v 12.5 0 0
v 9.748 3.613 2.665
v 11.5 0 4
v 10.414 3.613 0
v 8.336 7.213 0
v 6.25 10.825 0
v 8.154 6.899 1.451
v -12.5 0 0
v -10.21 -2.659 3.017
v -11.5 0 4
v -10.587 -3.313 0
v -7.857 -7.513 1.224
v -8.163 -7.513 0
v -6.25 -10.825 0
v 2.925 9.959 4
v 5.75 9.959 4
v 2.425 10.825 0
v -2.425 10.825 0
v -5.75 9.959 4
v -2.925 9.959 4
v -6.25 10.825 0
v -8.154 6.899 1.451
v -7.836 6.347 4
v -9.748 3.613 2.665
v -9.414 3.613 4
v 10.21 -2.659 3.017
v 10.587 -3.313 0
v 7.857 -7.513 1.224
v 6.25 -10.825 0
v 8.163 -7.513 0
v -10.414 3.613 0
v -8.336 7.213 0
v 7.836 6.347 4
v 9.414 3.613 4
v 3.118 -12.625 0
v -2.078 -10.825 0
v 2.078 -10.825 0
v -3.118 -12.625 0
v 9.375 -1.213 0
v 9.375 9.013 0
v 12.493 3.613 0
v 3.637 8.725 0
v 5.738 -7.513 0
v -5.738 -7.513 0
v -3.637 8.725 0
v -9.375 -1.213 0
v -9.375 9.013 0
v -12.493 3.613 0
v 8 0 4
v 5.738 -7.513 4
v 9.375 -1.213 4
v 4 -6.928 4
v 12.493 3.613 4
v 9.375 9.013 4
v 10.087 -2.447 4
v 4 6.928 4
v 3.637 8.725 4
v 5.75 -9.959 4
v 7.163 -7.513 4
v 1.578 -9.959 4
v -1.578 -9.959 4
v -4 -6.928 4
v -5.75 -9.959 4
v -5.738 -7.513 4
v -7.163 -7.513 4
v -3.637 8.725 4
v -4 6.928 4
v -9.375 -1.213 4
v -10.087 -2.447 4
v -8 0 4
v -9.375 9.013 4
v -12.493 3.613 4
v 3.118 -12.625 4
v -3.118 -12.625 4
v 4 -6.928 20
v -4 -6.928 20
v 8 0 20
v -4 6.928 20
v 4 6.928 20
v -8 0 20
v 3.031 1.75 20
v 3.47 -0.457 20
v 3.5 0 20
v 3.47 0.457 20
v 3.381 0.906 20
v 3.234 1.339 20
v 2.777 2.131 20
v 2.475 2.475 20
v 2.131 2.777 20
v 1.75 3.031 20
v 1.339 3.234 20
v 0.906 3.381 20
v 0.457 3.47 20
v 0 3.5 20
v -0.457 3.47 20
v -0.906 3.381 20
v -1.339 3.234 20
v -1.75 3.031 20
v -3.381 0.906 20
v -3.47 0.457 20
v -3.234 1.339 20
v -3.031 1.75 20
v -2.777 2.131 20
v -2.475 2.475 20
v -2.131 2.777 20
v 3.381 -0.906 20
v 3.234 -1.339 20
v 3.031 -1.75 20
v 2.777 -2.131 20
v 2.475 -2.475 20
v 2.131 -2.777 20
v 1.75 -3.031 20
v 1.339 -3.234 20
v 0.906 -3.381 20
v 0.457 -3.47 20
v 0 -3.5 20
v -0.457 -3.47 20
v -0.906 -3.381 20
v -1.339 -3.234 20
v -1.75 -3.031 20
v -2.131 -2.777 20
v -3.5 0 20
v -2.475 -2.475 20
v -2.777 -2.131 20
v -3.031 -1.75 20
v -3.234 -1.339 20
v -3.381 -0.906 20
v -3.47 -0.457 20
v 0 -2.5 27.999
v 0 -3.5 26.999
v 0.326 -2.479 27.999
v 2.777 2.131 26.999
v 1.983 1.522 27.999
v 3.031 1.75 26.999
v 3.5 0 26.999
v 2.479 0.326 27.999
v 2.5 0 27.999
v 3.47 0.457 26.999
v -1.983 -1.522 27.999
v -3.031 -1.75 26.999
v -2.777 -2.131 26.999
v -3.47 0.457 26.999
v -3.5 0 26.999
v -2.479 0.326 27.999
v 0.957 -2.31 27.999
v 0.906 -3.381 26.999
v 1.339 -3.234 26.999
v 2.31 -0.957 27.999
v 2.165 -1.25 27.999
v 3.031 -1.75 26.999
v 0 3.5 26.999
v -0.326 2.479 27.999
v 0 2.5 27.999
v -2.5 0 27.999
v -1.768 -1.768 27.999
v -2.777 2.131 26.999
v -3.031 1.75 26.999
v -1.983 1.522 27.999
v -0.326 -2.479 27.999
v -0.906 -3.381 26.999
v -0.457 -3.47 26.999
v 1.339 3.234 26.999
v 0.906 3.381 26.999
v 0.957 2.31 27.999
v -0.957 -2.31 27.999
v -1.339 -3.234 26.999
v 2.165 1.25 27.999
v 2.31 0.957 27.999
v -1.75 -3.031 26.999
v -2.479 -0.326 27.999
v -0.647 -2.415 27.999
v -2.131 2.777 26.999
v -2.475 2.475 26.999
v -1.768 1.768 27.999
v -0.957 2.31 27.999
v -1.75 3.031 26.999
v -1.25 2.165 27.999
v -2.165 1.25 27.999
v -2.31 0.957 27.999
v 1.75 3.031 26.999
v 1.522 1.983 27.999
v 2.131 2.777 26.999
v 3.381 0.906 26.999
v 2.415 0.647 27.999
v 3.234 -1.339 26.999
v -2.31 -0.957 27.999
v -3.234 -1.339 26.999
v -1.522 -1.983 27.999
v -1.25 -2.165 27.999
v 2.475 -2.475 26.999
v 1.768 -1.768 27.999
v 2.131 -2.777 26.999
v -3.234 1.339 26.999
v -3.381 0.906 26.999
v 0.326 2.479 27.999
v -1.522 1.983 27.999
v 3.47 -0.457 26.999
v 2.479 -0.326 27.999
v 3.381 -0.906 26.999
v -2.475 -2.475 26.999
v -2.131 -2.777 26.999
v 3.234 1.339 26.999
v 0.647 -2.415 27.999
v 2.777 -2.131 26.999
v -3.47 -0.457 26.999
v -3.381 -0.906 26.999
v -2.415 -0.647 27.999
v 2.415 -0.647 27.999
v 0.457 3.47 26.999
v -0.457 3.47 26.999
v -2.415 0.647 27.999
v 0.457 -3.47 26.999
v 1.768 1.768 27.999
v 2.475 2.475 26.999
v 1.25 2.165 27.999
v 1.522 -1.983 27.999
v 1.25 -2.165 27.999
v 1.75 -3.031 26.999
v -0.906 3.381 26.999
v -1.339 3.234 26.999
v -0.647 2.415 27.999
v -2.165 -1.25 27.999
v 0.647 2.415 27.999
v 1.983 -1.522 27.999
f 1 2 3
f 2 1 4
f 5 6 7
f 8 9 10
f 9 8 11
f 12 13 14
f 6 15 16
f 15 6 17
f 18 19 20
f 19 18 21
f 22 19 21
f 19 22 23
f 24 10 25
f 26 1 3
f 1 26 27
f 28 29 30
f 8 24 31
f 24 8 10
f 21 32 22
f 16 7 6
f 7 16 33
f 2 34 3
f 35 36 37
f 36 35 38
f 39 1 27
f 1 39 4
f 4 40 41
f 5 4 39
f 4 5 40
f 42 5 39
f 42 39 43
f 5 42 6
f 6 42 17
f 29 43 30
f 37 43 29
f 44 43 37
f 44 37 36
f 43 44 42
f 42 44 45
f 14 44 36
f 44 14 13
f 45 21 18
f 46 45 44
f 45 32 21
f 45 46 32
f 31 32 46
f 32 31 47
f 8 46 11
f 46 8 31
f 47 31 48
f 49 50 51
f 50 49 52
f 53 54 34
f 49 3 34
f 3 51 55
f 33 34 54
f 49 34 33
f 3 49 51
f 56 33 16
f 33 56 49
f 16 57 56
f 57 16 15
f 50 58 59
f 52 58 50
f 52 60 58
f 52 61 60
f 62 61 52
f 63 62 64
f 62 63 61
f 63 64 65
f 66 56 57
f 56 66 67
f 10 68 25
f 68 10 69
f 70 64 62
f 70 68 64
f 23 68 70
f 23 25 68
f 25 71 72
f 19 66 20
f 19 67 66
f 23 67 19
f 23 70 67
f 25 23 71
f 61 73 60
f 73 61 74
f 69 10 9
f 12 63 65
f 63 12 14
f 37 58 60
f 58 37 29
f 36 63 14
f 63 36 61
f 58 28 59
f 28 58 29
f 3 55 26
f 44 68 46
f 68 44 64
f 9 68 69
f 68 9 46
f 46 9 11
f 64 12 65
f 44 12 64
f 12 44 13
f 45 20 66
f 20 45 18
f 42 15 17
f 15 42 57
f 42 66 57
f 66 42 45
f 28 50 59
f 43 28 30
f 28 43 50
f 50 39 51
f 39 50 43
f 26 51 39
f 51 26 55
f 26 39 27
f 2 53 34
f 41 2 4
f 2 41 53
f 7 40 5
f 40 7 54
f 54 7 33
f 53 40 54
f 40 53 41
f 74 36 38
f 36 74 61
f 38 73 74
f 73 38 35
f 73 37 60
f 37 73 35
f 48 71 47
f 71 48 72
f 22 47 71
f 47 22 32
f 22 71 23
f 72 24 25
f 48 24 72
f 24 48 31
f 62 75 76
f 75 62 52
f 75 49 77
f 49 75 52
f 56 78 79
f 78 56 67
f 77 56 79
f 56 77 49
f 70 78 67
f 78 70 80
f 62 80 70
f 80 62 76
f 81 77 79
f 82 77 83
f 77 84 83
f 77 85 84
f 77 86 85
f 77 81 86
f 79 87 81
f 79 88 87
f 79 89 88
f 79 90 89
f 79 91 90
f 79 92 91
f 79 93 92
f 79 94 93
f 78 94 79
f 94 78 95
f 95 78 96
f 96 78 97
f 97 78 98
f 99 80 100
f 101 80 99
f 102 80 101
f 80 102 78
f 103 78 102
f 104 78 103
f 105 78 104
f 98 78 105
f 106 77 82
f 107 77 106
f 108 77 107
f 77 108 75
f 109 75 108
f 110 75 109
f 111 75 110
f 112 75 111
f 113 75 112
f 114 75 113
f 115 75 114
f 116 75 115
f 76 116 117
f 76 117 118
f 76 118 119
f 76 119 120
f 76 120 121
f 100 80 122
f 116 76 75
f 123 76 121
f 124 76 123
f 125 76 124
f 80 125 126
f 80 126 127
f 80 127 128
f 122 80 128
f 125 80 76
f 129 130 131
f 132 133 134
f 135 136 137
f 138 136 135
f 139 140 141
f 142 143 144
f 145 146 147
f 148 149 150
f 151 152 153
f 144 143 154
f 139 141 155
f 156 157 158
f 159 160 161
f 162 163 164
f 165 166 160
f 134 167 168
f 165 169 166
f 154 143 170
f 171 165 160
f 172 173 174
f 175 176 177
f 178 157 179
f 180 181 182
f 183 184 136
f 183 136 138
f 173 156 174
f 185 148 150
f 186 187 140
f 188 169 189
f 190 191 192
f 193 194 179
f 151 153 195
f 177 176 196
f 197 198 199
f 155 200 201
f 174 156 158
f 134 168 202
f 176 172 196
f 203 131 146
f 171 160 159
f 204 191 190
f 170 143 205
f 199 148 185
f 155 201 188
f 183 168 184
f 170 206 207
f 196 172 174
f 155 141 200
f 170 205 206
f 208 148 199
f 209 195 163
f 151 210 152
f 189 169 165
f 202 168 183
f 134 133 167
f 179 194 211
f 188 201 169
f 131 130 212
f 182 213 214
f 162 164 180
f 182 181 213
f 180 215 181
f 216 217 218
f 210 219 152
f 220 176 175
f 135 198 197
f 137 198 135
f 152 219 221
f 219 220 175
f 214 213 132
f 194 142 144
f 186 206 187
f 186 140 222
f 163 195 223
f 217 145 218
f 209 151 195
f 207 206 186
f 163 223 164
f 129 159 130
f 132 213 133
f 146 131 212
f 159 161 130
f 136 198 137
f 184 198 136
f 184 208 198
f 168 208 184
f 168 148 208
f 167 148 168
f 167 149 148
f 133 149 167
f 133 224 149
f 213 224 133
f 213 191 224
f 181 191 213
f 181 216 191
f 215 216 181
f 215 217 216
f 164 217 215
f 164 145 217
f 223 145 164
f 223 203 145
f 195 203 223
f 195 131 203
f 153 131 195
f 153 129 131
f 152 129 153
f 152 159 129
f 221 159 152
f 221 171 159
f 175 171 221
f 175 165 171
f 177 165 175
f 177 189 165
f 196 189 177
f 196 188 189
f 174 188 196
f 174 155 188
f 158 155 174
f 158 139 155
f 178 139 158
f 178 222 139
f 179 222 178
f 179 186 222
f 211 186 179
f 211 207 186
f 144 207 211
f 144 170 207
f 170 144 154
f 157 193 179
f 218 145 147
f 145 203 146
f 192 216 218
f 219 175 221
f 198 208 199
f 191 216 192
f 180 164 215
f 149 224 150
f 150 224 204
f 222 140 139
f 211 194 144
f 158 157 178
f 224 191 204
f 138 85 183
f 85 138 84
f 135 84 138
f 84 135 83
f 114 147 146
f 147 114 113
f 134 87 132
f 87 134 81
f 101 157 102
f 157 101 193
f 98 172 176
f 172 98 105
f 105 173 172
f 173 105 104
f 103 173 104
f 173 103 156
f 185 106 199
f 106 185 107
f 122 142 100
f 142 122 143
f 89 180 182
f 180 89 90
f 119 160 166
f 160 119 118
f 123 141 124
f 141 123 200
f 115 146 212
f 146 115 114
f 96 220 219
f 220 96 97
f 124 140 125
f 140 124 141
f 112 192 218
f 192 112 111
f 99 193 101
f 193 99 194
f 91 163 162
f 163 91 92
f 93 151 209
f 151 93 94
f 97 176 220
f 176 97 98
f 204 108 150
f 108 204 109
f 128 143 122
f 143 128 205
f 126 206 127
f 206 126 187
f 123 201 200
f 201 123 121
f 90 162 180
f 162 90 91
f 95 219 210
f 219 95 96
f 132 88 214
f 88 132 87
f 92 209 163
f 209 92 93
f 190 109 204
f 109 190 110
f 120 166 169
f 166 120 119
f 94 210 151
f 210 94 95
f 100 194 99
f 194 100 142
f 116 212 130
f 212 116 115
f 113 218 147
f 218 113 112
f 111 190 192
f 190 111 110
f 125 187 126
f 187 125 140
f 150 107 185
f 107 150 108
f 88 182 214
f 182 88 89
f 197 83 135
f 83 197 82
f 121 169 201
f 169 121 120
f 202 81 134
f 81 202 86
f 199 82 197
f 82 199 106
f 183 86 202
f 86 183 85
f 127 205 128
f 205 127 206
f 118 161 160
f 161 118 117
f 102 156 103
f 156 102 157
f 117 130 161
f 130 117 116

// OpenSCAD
$fn=48;



h = 4;
module ooshi_base(h) {
    apothem = 25 * cos((3.141592653/6)* 57.2958);
    difference() {
        union() {
            cylinder(r1=25/2, r2=23/2, h=h, $fn=6);
        }
        
        rotate([0,0,(360/12) * 1]) translate([-apothem/2,0,-0.5]) rotate([0,0,60]) cylinder(r=4.2, h=h+1, $fn=3);
        rotate([0,0,(360/12) * 9]) translate([-apothem/2,0,-0.5]) rotate([0,0,60]) cylinder(r=4.2, h=h+1, $fn=3);
        rotate([0,0,(360/12) * 5]) translate([-apothem/2,0,-0.5]) rotate([0,0,60]) cylinder(r=4.2, h=h+1, $fn=3);
    }
    
    rotate([0,0,(360/12) * 7]) translate([-apothem/2,0,0]) cylinder(r=3.6, h=h, $fn=3);
    rotate([0,0,(360/12) * 3]) translate([-apothem/2,0,0]) cylinder(r=3.6, h=h, $fn=3);
    rotate([0,0,(360/12) * 11]) translate([-apothem/2,0,0]) cylinder(r=3.6, h=h, $fn=3);
}

module ooshi() {
	h = 4;
	ooshi_base(h);
	translate([0, 0, h+6+0.999]) cylinder(r1=7/2, r2=5/2, h=1);
	translate([0, 0, 1.999]) cylinder(d=7, h=(h+6)-1);
}

module ooshi_tall() {
	h = 4;
	ooshi_base(h);
	cylinder(r=16/2, h=20, $fn=6);
	translate([0, 0, (20-h)+h+6+0.999]) cylinder(r1=7/2, r2=5/2, h=1);
	translate([0, 0, (20-h)+1.999]) cylinder(d=7, h=(h+6)-1);
}

a = 25 * cos((3.141592653/6)* 57.2958);
ooshi_tall();
if (false) {
translate([0,a*1,0]) ooshi();
translate([0,a*2,0]) ooshi();
translate([0,a*3,0]) ooshi();
translate([0,a*4,0]) ooshi();

translate([18.751,a*0.5,0]) ooshi();
translate([18.751,a*1.5,0]) ooshi();
translate([18.751,a*2.5,0]) ooshi();
translate([18.751,a*3.5,0]) ooshi();
translate([18.751,a*4.5,0]) ooshi();
}
